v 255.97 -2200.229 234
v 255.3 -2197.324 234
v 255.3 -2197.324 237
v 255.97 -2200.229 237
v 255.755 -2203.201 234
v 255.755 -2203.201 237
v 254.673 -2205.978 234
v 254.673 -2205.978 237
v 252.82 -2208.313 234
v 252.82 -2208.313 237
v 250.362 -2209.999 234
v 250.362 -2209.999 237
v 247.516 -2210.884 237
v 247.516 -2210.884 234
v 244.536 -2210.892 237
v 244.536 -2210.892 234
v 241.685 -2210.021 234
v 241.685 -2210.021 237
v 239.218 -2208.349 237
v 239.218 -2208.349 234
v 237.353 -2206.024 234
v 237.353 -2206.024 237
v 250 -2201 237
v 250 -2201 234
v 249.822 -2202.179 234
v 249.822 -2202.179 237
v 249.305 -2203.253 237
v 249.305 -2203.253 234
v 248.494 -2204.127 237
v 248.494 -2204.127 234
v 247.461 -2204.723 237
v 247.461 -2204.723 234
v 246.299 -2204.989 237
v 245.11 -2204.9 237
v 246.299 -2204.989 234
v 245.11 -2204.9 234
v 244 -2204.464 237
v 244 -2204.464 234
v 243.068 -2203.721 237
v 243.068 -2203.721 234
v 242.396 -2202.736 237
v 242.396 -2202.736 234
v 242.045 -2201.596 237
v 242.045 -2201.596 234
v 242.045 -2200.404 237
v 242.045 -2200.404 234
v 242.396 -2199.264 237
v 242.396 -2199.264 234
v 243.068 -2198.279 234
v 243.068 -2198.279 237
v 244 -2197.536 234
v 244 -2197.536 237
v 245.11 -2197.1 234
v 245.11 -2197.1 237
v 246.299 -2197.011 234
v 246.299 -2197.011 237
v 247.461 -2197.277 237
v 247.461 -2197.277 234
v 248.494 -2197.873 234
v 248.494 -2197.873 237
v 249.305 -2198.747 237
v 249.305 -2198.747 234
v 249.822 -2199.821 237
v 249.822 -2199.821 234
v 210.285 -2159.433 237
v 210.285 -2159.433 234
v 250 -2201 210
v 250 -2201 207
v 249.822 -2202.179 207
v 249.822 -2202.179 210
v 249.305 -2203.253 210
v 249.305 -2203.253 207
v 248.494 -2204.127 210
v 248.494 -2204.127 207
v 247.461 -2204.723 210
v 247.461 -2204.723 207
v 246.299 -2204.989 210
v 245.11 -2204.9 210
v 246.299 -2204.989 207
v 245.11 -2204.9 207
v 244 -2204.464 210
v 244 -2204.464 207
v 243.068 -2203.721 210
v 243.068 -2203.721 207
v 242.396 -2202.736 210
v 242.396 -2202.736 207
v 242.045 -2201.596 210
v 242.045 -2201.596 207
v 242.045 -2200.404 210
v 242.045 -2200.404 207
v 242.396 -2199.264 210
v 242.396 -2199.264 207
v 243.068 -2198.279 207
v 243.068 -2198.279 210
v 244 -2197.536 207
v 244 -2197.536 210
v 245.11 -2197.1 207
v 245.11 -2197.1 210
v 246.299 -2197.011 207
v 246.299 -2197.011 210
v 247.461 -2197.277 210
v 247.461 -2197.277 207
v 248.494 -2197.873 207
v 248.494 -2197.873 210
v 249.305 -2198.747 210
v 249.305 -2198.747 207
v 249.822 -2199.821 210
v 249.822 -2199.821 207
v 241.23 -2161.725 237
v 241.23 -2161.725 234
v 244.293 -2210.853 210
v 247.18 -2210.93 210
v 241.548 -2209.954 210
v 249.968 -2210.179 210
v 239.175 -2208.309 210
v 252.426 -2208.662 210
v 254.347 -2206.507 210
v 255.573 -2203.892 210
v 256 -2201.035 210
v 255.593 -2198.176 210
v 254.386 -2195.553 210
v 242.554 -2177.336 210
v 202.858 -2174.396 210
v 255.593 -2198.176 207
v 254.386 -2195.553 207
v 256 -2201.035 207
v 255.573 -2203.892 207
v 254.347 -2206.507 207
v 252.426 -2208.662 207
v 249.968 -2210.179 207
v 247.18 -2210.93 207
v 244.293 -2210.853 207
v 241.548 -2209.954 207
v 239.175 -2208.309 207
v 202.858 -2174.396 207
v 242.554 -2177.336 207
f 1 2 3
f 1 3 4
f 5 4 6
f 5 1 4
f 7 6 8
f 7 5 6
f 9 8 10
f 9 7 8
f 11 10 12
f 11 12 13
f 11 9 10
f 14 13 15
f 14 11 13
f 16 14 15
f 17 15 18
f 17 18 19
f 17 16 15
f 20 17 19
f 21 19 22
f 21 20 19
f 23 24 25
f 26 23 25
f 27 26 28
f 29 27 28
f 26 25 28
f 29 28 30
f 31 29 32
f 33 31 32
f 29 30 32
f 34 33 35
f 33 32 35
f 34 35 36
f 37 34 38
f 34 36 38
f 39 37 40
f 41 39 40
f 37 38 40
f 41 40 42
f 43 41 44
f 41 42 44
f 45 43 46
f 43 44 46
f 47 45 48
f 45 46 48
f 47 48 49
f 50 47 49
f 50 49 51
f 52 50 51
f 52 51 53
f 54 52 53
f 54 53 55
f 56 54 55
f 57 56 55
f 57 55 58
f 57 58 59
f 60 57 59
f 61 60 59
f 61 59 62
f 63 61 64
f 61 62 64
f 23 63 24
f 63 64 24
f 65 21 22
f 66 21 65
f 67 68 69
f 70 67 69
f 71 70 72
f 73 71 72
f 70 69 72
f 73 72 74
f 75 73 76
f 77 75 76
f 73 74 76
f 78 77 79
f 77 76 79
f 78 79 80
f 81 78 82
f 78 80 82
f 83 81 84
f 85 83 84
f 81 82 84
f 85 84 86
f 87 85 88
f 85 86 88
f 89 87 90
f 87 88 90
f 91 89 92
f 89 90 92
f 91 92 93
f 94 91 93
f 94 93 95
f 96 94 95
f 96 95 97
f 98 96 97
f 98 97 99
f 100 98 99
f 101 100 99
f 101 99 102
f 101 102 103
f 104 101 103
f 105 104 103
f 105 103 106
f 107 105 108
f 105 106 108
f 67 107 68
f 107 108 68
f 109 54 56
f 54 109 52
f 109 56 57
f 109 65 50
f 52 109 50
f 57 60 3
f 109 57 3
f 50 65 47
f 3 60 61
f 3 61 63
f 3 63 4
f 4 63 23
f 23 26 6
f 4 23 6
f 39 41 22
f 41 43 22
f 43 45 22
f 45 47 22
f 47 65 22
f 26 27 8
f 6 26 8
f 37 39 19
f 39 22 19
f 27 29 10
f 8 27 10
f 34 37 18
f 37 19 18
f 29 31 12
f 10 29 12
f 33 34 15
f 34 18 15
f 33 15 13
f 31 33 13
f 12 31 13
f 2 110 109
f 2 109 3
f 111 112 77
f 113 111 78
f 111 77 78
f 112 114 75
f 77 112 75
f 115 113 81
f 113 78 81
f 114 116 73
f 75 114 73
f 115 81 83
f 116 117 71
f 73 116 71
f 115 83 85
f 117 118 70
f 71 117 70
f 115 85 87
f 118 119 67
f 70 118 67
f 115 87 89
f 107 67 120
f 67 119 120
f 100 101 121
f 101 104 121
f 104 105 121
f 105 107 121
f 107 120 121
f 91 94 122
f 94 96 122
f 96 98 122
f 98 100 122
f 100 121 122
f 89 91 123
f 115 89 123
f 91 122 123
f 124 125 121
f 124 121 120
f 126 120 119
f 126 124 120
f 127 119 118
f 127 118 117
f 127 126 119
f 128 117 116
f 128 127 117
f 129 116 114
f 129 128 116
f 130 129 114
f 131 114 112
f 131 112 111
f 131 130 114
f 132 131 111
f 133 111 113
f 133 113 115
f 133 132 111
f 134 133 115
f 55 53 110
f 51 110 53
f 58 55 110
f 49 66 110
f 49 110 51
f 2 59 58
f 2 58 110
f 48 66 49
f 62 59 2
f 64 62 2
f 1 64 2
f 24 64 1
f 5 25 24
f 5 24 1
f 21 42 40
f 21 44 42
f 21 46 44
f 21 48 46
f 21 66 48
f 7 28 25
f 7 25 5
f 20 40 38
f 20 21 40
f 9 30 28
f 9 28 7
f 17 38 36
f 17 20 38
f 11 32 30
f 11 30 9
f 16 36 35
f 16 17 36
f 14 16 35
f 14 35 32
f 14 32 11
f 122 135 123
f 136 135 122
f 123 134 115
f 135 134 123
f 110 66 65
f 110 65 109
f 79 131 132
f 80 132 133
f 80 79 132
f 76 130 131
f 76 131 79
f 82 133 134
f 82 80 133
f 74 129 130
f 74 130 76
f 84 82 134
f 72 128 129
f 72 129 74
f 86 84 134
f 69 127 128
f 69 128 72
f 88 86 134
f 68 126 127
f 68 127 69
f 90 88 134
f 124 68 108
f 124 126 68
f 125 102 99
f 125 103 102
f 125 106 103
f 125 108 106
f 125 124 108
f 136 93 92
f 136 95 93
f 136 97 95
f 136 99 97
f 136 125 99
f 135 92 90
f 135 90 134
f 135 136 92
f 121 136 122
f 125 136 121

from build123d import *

# Parameters (mm, degrees)
F_3DSKETCH1_R       = 4
BOSS_EXTRUDE1_DEPTH = 3
BOSS_EXTRUDE2_START = 3
F_3DSKETCH1_3_R     = 4
BOSS_EXTRUDE2_DEPTH = 3


with BuildPart() as part:
    # 3DSketch1 → Boss-Extrude1 (new body)
    with BuildSketch(Plane(origin=(210.284879759, -2159.432918783, 234), x_dir=(0.765045268055925, -0.643976504094084, 0), z_dir=(0, 0, -1))):
        with BuildLine():
            Line((0, 0), (25.150628352, -18.174318588))
            Line((25.150628352, -18.174318588), (58.839790062, 0))
            ThreePointArc((58.839790062, 0), (63.223787862, 12.876385034), (50.7119139, 18.212463954))
            Line((50.7119139, 18.212463954), (0, 0))
        make_face()
        with Locations(Location((54.091907386, 8.801000516, 0), (0, 0, 319.911019429))):
            Circle(F_3DSKETCH1_R, mode=Mode.SUBTRACT)
    extrude(amount=-BOSS_EXTRUDE1_DEPTH)


with BuildPart() as body_2:
    # 3DSketch1<3> → Boss-Extrude2 (new body)
    with BuildSketch(Plane(origin=(239.174999692, -2208.308855642, 210), x_dir=(-0.7308855641899759, 0.6825000308122343, 0), z_dir=(0, 0, -1)).offset(BOSS_EXTRUDE2_START)):
        with BuildLine():
            Line((0, 0), (49.689163225, 0))
            Line((49.689163225, 0), (18.669359488, 24.943165231))
            Line((18.669359488, 24.943165231), (-2.411519809, 19.704873632))
            ThreePointArc((-2.411519809, 19.704873632), (-9.925944195, 8.785244123), (0, 0))
        make_face()
        with Locations(Location((0, 10, 0), (0, 0, 136.960685483))):
            Circle(F_3DSKETCH1_3_R, mode=Mode.SUBTRACT)
    extrude(amount=-BOSS_EXTRUDE2_DEPTH)


solid = Compound([part.part, body_2.part])
